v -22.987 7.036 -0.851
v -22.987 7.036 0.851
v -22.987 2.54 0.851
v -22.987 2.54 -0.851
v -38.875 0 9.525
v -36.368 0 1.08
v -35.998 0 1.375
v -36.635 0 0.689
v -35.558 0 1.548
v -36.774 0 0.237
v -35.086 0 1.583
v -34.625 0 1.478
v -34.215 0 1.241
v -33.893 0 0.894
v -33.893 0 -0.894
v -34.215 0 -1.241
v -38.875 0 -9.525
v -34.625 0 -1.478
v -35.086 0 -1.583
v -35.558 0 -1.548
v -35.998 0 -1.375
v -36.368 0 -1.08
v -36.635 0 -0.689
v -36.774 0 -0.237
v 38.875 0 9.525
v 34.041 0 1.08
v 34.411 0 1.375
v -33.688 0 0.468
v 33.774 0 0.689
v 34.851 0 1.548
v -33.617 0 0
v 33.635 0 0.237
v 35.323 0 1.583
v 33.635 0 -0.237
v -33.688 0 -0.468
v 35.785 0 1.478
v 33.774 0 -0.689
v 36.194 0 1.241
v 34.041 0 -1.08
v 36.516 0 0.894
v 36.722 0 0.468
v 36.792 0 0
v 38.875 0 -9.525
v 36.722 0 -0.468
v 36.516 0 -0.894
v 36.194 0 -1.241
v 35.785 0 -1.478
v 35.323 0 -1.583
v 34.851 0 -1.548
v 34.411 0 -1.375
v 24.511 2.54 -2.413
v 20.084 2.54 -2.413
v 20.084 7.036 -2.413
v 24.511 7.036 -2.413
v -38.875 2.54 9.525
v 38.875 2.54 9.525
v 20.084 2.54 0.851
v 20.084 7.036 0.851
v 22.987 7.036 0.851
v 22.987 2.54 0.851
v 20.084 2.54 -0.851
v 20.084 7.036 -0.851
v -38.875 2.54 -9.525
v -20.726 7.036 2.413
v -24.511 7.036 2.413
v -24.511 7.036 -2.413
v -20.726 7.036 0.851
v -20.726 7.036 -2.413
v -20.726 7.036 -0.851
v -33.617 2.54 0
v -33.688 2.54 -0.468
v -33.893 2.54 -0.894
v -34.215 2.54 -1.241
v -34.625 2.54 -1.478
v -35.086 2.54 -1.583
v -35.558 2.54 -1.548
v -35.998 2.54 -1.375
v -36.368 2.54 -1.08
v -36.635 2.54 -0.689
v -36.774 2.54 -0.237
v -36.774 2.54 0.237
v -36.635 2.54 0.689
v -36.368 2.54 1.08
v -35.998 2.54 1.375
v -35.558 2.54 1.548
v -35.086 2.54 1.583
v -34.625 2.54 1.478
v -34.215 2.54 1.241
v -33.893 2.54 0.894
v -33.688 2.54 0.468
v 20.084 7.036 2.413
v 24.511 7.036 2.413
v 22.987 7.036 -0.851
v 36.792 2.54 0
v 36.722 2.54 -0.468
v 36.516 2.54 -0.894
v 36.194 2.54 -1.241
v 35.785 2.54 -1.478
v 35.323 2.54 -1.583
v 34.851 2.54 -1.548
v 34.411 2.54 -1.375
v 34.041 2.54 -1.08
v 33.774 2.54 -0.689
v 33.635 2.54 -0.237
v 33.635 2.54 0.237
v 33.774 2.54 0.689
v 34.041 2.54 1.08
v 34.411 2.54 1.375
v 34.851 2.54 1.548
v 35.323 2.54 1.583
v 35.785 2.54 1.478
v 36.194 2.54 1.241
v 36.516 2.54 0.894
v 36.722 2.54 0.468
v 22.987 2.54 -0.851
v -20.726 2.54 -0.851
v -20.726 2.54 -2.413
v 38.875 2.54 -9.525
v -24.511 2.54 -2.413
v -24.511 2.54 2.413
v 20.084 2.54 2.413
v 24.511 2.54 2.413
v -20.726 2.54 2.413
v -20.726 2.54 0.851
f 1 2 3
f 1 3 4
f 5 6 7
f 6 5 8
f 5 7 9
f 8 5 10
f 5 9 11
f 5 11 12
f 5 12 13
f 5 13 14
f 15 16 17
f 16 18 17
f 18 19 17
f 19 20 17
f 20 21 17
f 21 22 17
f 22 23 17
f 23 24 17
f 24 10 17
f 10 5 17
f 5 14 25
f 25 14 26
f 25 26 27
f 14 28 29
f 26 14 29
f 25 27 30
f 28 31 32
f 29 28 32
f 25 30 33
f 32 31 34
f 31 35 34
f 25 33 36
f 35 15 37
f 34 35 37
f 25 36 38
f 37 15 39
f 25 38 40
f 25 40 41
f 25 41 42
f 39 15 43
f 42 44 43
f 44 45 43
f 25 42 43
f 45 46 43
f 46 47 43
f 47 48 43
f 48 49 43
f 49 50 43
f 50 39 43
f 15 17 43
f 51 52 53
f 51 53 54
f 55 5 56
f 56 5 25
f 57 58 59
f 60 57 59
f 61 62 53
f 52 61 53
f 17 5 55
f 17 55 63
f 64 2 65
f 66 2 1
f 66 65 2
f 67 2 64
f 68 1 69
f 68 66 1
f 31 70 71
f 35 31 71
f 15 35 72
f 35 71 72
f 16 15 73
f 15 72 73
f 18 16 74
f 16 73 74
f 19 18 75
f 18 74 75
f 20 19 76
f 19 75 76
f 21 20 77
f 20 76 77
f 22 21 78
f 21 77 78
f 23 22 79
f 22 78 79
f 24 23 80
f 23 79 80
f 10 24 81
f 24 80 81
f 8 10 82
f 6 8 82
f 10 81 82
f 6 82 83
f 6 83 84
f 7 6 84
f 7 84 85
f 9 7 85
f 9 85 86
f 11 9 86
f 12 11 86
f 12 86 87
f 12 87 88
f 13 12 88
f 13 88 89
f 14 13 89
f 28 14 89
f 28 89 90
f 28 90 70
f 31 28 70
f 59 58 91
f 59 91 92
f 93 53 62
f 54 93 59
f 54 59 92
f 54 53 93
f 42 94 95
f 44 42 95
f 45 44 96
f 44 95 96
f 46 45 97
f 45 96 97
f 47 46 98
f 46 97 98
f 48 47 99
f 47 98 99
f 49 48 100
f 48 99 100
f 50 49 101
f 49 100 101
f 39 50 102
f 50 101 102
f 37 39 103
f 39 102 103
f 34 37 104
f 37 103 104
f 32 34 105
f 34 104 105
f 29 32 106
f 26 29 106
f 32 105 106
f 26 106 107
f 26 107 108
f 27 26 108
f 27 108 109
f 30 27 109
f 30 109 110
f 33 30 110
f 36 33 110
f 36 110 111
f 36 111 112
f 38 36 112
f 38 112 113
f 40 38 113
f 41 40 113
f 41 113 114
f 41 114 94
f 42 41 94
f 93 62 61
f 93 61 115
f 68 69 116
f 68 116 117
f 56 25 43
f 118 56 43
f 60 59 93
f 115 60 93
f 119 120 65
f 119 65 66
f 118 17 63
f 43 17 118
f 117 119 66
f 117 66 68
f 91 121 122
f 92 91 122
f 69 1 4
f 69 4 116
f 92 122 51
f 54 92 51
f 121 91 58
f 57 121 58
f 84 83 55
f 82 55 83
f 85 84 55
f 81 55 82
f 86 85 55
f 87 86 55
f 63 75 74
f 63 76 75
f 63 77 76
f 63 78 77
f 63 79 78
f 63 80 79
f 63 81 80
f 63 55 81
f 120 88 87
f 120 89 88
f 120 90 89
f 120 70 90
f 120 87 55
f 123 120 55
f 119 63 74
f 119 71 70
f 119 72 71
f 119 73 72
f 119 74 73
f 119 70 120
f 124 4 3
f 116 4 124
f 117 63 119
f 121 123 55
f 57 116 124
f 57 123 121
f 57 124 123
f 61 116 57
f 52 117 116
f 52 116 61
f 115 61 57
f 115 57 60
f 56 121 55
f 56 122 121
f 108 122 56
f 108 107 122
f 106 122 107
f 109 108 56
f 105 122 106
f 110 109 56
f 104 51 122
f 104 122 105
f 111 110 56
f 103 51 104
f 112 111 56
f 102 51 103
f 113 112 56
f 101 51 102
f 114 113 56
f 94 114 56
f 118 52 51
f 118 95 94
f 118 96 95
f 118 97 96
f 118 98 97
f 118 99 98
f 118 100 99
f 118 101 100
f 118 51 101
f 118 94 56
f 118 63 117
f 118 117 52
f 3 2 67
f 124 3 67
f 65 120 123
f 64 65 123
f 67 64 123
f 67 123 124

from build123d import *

# Parameters (mm, degrees)
SKETCH1_W           = 77.75
SKETCH1_H           = 19.05
BOSS_EXTRUDE1_DEPTH = 2.54
SKETCH2_R           = 1.5875
CUT_EXTRUDE1_DEPTH  = 3.54
SKETCH3_W           = 49.022
SKETCH3_H           = 4.826
BOSS_EXTRUDE2_DEPTH = 4.4958
SKETCH4_W           = 45.974
SKETCH4_H           = 1.7018
CUT_EXTRUDE2_DEPTH  = 4.4958
SKETCH6_W           = 40.810788913
SKETCH6_H           = 1.5621
CUT_EXTRUDE3_DEPTH  = 4.4958


with BuildPart() as part:
    # Sketch1 → Boss-Extrude1 (new body)
    with BuildSketch(Plane(origin=(0, 0, 0), x_dir=(1, 0, 0), z_dir=(0, 1, 0))):
        Rectangle(SKETCH1_W, SKETCH1_H)
    extrude(amount=BOSS_EXTRUDE1_DEPTH)

    # Sketch2 → Cut-Extrude1 (cut, through all)
    with BuildSketch(Plane(origin=(0, 2.54, 0), x_dir=(1, 0, 0), z_dir=(0, 1, 0))):
        with Locations((35.2047, 0)):
            Circle(SKETCH2_R)
        with Locations((-35.2047, 0)):
            Circle(SKETCH2_R)
    extrude(amount=-CUT_EXTRUDE1_DEPTH, mode=Mode.SUBTRACT)

    # Sketch3 → Boss-Extrude2 (add)
    with BuildSketch(Plane(origin=(0, 2.54, 0), x_dir=(1, 0, 0), z_dir=(0, 1, 0))):
        Rectangle(SKETCH3_W, SKETCH3_H)
    extrude(amount=BOSS_EXTRUDE2_DEPTH)

    # Sketch4 → Cut-Extrude2 (cut)
    with BuildSketch(Plane(origin=(0, 7.0358, 0), x_dir=(1, 0, 0), z_dir=(0, 1, 0))):
        Rectangle(SKETCH4_W, SKETCH4_H)
    extrude(amount=-CUT_EXTRUDE2_DEPTH, mode=Mode.SUBTRACT)

    # Sketch6 → Cut-Extrude3 (cut)
    with BuildSketch(Plane(origin=(0, 7.0358, 0), x_dir=(1, 0, 0), z_dir=(0, 1, 0))):
        with Locations((-0.321005544, -1.63195)):
            Rectangle(SKETCH6_W, SKETCH6_H)
        with Locations((-0.321005544, 1.63195)):
            Rectangle(SKETCH6_W, SKETCH6_H)
    extrude(amount=-CUT_EXTRUDE3_DEPTH, mode=Mode.SUBTRACT)


solid = part.part
